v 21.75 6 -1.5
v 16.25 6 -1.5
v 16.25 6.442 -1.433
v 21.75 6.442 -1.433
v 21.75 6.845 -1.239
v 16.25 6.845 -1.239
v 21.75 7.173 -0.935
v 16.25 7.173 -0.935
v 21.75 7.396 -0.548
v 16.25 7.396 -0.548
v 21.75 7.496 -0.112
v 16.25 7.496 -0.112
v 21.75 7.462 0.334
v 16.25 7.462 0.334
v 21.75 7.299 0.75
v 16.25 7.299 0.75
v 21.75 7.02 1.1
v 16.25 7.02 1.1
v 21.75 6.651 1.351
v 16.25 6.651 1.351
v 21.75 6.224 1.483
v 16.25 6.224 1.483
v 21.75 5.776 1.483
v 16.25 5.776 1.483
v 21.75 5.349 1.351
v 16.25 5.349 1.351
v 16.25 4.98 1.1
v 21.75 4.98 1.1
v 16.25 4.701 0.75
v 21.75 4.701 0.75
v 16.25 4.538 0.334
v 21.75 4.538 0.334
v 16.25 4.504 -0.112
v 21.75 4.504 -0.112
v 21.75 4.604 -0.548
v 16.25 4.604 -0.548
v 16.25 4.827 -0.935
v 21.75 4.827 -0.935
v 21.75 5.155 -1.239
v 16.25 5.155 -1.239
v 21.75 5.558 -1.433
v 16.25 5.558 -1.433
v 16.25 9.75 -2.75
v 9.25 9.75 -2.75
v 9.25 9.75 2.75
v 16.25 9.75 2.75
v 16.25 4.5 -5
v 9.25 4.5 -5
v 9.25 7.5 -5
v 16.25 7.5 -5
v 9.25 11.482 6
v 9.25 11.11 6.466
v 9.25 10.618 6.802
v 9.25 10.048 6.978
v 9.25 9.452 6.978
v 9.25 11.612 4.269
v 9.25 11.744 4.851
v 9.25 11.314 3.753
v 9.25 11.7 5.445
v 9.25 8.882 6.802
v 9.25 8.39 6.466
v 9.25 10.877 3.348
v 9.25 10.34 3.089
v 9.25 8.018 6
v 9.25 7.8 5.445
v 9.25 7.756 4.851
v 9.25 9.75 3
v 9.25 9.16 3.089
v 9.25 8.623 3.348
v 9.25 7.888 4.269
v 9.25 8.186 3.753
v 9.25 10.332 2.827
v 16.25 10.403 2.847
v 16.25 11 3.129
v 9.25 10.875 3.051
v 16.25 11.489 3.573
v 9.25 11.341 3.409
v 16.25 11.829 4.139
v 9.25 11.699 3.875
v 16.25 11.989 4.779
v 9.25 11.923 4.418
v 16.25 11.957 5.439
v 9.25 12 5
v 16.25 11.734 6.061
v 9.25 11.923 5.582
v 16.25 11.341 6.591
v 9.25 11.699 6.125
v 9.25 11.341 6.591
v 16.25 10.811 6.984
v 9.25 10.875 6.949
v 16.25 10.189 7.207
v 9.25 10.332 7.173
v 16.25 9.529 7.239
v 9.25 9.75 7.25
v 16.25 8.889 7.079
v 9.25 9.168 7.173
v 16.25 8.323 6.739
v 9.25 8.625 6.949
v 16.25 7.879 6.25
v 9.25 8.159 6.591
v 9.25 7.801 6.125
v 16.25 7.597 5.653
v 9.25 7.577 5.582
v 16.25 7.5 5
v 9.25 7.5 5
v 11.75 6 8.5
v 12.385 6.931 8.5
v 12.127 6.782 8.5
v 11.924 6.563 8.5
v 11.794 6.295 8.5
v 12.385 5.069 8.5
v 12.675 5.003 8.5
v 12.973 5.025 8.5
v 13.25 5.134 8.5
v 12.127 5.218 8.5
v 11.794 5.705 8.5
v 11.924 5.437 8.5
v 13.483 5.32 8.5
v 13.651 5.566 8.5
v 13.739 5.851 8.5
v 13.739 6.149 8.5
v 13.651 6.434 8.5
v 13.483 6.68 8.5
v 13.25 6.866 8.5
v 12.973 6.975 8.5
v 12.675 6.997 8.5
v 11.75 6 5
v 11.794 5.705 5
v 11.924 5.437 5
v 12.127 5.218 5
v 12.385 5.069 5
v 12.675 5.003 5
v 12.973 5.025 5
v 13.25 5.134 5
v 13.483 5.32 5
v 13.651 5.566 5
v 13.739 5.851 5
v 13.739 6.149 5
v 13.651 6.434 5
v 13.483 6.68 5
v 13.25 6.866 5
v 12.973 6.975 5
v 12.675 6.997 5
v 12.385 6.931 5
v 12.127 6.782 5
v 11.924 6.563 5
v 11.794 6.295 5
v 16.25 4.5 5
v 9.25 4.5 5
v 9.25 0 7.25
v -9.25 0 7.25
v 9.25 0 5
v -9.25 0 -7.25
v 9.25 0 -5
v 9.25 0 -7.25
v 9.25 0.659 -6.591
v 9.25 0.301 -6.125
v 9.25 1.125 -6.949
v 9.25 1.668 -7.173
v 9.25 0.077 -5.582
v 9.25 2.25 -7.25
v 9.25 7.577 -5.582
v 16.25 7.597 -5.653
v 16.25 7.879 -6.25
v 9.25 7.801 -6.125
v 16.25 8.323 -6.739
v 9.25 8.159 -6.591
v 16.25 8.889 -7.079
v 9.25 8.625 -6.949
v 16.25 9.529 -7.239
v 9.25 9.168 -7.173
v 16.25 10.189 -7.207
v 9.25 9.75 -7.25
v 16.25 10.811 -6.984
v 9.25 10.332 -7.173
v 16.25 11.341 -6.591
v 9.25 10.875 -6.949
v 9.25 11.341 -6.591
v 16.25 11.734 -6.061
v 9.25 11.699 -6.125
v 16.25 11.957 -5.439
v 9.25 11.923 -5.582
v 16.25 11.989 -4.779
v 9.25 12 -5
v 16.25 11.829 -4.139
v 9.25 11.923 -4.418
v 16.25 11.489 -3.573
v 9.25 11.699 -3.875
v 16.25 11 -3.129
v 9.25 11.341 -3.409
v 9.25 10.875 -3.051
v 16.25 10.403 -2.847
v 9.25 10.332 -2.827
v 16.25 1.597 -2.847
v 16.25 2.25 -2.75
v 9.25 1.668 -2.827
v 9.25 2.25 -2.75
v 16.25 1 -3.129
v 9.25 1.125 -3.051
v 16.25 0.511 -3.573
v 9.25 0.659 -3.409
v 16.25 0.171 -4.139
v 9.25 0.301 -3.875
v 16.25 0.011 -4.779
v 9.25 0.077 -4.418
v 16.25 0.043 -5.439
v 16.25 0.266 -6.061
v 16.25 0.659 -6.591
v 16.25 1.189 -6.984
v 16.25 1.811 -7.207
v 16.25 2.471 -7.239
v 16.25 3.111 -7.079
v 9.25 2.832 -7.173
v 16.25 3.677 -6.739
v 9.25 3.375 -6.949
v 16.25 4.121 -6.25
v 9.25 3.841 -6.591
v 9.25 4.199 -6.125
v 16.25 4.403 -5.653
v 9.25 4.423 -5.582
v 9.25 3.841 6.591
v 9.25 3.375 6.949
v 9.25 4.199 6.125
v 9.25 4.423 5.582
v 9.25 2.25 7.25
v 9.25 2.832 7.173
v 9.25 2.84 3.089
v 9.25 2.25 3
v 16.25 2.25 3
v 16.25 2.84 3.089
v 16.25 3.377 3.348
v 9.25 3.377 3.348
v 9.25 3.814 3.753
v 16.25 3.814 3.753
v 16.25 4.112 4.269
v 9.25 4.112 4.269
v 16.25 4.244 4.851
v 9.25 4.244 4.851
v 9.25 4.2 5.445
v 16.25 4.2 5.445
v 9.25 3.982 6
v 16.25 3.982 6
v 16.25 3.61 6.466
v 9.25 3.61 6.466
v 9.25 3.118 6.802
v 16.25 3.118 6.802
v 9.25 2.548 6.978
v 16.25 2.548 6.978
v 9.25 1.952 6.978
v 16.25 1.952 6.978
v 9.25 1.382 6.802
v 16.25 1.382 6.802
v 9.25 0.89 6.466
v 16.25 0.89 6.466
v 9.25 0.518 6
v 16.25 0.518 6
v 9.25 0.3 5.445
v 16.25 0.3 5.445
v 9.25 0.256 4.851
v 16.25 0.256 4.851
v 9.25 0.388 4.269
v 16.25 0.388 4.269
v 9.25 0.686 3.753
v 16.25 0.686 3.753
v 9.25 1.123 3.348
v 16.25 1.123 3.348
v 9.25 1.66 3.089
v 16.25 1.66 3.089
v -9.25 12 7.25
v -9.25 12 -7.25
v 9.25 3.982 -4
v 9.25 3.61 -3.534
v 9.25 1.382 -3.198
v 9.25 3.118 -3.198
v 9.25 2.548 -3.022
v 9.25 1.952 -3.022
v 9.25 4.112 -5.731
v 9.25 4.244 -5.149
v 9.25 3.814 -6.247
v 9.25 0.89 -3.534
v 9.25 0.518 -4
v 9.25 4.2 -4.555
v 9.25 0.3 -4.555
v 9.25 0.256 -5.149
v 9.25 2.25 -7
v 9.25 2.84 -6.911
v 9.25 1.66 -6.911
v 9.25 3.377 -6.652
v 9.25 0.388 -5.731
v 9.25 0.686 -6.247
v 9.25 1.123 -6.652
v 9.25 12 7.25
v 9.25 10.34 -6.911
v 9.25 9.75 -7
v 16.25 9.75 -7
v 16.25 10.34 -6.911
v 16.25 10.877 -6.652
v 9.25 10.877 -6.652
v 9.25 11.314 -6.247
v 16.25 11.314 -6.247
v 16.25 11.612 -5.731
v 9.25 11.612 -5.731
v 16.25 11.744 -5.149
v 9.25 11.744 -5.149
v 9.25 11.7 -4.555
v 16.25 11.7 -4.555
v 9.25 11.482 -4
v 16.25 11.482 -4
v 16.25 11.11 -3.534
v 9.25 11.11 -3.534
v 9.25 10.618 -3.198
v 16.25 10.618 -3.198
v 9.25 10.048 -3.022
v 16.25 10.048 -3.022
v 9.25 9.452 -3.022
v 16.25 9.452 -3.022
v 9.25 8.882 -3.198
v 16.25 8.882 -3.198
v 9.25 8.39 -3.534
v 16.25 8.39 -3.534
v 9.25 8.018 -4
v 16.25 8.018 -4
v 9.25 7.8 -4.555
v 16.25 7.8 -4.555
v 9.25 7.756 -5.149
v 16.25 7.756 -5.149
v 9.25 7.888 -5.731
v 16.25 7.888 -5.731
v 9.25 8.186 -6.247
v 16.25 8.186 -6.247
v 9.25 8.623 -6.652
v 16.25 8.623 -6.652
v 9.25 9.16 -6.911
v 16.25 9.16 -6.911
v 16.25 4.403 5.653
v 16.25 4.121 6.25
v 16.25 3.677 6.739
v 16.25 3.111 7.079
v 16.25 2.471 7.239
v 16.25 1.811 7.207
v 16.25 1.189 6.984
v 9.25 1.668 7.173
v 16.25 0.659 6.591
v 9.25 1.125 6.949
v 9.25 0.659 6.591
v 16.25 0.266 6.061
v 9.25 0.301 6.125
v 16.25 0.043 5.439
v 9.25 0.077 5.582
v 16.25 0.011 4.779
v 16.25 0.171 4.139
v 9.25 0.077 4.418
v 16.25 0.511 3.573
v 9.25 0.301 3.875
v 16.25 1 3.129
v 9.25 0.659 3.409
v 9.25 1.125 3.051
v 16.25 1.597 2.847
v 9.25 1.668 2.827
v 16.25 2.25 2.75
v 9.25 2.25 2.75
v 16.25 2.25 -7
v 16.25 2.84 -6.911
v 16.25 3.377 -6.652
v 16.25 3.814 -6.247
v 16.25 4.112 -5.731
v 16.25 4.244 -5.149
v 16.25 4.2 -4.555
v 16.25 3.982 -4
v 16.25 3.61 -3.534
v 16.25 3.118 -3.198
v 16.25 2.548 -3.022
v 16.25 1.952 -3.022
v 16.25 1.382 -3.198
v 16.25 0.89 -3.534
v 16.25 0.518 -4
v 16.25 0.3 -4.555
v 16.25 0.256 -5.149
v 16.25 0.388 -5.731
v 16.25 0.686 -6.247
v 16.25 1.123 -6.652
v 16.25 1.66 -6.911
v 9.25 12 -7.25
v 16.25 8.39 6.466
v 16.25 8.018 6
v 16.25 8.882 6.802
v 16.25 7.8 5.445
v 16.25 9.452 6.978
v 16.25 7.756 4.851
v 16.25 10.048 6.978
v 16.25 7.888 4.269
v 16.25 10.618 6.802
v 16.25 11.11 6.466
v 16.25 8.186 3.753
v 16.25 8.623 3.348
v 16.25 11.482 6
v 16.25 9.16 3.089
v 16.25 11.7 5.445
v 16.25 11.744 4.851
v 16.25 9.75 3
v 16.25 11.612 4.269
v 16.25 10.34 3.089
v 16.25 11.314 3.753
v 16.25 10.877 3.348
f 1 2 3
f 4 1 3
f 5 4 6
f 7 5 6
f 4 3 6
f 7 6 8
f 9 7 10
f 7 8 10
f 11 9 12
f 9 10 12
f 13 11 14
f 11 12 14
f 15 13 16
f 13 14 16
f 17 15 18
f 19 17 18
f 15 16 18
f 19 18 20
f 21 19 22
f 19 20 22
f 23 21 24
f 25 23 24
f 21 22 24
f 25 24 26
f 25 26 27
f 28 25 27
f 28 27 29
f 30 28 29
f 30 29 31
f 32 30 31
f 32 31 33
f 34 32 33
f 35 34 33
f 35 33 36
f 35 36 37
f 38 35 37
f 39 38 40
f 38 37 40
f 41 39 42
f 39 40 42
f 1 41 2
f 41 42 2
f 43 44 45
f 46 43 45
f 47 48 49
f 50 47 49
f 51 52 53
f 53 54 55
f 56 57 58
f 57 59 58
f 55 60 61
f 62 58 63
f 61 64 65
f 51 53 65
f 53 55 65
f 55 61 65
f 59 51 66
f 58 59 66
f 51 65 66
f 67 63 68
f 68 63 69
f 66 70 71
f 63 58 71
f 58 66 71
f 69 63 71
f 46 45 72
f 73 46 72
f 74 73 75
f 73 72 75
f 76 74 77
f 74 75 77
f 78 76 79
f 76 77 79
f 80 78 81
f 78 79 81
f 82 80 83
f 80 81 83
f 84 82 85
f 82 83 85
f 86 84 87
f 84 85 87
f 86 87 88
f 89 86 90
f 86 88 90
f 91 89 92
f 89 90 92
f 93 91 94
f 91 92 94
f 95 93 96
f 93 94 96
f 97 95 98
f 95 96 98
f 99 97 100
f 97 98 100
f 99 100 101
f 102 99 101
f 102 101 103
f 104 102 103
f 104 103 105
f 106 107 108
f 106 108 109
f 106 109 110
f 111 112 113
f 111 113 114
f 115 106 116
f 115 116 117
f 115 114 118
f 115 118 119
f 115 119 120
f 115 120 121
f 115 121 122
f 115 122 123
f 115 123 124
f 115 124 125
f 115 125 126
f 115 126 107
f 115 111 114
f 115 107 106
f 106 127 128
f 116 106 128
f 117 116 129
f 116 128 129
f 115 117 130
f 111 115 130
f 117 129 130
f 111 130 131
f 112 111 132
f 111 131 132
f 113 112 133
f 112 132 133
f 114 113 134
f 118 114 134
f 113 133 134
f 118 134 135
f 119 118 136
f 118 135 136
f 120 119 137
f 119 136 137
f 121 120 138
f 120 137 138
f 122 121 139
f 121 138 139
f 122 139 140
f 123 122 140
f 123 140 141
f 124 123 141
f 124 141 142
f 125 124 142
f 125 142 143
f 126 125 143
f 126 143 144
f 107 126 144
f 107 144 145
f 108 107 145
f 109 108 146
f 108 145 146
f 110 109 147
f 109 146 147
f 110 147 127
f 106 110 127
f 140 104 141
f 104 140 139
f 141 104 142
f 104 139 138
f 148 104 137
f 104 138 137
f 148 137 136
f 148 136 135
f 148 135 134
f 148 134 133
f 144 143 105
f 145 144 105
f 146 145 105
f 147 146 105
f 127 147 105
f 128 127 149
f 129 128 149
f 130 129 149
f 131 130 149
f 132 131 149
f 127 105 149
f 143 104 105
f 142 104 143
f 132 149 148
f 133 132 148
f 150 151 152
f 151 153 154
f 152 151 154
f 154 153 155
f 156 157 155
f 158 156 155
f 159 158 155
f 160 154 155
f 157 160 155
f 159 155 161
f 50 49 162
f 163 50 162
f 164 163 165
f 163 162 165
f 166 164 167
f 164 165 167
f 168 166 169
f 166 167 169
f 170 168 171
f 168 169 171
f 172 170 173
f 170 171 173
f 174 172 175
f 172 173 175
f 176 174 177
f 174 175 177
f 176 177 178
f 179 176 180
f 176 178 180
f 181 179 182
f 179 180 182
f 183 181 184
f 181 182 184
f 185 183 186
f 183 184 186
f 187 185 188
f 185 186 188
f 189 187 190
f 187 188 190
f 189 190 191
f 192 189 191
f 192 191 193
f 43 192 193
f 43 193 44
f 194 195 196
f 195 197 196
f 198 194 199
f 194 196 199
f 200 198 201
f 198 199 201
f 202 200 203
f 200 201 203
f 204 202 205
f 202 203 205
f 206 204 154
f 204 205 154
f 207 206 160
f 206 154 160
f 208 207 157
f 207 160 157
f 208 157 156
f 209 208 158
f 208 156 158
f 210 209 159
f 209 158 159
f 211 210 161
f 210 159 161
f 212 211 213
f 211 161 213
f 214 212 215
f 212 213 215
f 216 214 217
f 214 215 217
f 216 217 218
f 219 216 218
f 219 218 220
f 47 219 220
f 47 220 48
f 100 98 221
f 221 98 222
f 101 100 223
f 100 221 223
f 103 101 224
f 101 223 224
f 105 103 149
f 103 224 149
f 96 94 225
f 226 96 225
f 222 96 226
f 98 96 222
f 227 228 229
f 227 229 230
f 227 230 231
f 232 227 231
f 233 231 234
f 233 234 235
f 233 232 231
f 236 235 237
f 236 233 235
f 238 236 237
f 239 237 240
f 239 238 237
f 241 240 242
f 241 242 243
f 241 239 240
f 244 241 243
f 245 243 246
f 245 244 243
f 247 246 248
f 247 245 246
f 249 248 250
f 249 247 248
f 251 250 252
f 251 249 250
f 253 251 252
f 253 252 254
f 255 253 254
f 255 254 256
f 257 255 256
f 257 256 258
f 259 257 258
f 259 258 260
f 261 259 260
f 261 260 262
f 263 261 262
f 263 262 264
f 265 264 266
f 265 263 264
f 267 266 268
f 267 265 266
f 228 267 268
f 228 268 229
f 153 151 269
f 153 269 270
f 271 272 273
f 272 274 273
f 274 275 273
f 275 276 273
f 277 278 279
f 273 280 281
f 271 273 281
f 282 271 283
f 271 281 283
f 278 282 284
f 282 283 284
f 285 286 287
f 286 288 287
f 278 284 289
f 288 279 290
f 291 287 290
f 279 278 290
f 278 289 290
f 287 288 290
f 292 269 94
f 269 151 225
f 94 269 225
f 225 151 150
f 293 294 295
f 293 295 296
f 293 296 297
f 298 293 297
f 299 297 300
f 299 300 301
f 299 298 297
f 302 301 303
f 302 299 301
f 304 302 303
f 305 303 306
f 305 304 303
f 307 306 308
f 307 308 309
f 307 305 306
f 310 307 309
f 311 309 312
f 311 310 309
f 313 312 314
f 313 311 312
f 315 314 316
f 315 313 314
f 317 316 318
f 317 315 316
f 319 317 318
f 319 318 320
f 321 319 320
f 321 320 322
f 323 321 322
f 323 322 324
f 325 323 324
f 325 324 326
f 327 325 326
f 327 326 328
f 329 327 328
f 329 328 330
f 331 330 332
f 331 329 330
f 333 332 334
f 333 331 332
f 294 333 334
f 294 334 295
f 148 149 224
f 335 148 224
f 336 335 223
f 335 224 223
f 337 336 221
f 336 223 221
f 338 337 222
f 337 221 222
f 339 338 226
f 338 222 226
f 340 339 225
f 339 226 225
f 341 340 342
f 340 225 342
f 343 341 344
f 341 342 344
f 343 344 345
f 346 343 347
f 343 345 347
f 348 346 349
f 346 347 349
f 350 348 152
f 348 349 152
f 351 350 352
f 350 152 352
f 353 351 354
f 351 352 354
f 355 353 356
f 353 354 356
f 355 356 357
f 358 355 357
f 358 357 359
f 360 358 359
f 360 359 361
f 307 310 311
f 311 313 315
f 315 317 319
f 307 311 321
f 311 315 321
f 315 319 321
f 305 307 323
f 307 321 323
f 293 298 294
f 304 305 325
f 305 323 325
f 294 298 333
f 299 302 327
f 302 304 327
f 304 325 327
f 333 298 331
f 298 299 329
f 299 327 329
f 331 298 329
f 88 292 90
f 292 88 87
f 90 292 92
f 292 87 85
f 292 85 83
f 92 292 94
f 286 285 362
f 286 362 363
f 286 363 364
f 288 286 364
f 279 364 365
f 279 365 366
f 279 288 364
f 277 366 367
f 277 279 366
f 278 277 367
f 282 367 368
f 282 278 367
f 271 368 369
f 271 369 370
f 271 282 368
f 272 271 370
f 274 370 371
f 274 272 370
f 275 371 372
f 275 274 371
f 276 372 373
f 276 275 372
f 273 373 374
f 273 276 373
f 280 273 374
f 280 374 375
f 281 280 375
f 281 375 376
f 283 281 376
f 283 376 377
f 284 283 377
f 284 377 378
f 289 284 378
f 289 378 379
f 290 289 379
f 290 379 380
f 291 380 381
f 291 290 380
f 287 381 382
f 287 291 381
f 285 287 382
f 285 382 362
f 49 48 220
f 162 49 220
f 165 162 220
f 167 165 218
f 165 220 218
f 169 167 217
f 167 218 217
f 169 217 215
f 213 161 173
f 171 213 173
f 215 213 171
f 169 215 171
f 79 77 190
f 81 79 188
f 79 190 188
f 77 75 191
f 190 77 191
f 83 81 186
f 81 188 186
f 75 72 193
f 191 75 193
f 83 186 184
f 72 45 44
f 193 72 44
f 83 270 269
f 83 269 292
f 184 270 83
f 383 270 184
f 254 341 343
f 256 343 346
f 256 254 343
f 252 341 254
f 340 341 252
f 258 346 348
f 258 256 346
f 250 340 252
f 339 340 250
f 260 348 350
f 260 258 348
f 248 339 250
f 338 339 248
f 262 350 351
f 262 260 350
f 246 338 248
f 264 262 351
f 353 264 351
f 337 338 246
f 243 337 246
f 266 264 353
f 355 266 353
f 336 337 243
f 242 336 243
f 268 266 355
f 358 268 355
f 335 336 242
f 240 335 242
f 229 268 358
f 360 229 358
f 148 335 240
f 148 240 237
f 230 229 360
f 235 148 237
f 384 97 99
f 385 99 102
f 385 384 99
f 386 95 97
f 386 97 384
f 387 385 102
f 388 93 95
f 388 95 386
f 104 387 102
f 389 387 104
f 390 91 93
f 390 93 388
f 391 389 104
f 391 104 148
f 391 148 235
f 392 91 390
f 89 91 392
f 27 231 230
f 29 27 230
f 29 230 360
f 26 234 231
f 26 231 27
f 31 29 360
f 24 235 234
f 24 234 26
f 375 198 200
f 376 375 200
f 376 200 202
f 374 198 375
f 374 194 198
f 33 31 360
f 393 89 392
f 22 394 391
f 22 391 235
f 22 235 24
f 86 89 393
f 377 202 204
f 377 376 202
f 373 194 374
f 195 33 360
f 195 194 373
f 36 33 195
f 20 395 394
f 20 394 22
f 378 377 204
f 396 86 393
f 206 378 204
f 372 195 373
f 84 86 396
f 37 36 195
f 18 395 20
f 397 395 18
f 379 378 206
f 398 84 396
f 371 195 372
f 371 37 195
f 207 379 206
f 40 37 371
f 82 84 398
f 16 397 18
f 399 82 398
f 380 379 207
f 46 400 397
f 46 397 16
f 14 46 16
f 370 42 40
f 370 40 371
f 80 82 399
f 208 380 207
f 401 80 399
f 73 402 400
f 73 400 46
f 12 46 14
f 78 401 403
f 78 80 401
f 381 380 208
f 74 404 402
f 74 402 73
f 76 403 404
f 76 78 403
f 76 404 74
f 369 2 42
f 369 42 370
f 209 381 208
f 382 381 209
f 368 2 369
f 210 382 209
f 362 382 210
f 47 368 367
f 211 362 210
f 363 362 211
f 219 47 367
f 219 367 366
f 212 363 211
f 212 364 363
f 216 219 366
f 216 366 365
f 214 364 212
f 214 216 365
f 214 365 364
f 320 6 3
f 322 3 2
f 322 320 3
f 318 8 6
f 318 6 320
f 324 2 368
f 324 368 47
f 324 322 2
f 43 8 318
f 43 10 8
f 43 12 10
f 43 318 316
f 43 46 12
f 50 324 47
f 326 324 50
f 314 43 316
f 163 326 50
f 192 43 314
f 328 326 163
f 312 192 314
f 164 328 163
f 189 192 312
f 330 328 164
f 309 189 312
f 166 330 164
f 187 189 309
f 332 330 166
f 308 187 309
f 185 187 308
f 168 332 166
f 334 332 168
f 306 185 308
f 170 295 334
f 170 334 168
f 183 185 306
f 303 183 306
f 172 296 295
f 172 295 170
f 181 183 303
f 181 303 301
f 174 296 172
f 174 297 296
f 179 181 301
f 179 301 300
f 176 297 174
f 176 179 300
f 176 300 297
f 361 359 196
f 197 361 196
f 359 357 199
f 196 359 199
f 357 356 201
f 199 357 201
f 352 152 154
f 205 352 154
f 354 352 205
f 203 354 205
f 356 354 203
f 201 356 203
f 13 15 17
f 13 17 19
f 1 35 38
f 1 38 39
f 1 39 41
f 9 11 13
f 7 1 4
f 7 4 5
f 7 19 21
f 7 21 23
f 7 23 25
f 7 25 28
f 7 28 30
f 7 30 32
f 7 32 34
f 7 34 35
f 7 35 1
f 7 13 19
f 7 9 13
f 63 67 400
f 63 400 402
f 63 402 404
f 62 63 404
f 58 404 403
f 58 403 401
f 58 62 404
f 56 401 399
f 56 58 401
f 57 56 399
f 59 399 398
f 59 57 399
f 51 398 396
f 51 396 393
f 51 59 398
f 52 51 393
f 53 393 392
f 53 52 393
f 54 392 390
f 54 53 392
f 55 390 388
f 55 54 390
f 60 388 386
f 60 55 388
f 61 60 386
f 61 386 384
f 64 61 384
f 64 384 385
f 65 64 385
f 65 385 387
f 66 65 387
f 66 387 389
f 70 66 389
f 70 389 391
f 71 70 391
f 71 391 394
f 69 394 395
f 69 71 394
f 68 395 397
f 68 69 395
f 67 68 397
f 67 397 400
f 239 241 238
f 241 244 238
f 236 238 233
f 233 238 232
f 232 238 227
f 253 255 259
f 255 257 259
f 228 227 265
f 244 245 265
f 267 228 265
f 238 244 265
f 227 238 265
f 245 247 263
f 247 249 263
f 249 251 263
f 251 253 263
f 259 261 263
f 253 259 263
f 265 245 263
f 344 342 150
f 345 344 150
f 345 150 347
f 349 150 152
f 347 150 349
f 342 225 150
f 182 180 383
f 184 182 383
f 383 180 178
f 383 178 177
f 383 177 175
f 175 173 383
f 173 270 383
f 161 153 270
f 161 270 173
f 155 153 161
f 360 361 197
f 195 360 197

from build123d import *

# Parameters (mm, degrees)
SKETCH_1_W      = 18.5
SKETCH_1_H      = 14.5
EXTRUDE_1_DEPTH = 12
SKETCH_2_R      = 2.25
SKETCH_2_R_2    = 2
EXTRUDE_2_DEPTH = 7
SKETCH_4_R      = 1.5
EXTRUDE_3_DEPTH = 5.5
SKETCH_6_R      = 1
EXTRUDE_4_DEPTH = 3.5


with BuildPart() as part:
    # 스케치1 → 보스-돌출1 (new body)
    with BuildSketch(Plane(origin=(0, 0, 0), x_dir=(1, 0, 0), z_dir=(0, 1, 0))):
        Rectangle(SKETCH_1_W, SKETCH_1_H)
    extrude(amount=EXTRUDE_1_DEPTH)

    # 스케치2 → 보스-돌출2 (add)
    # profile 1 of 5: a face of its own
    with BuildSketch(Plane(origin=(9.25, 0, 0), x_dir=(0, 0, -1), z_dir=(1, 0, 0))):
        with Locations((-5, 9.75)):
            Circle(SKETCH_2_R)
        with Locations((-5, 9.75)):
            Circle(SKETCH_2_R_2, mode=Mode.SUBTRACT)
    # profile 2 of 5: a face of its own
    with BuildSketch(Plane(origin=(9.25, 0, 0), x_dir=(0, 0, -1), z_dir=(1, 0, 0))):
        with BuildLine():
            Line((2.75, 9.75), (-2.75, 9.75))
            ThreePointArc((-2.75, 9.75), (-3.409009742, 8.159009742), (-5, 7.5))
            Line((-5, 7.5), (-5, 4.5))
            ThreePointArc((-5, 4.5), (-3.409009742, 3.840990258), (-2.75, 2.25))
            Line((-2.75, 2.25), (2.75, 2.25))
            ThreePointArc((2.75, 2.25), (3.409009742, 3.840990258), (5, 4.5))
            Line((5, 4.5), (5, 7.5))
            ThreePointArc((5, 7.5), (3.409009742, 8.159009742), (2.75, 9.75))
        make_face()
    # profile 3 of 5: a face of its own
    with BuildSketch(Plane(origin=(9.25, 0, 0), x_dir=(0, 0, -1), z_dir=(1, 0, 0))):
        with Locations((5, 9.75)):
            Circle(SKETCH_2_R)
        with Locations((5, 9.75)):
            Circle(SKETCH_2_R_2, mode=Mode.SUBTRACT)
    # profile 4 of 5: a face of its own
    with BuildSketch(Plane(origin=(9.25, 0, 0), x_dir=(0, 0, -1), z_dir=(1, 0, 0))):
        with Locations((5, 2.25)):
            Circle(SKETCH_2_R)
        with Locations((5, 2.25)):
            Circle(SKETCH_2_R_2, mode=Mode.SUBTRACT)
    # profile 5 of 5: a face of its own
    with BuildSketch(Plane(origin=(9.25, 0, 0), x_dir=(0, 0, -1), z_dir=(1, 0, 0))):
        with Locations((-5, 2.25)):
            Circle(SKETCH_2_R)
        with Locations((-5, 2.25)):
            Circle(SKETCH_2_R_2, mode=Mode.SUBTRACT)
    extrude(amount=EXTRUDE_2_DEPTH)

    # 스케치4 → 보스-돌출3 (add)
    with BuildSketch(Plane(origin=(16.25, 0, 0), x_dir=(0, 0, -1), z_dir=(1, 0, 0))):
        with Locations((0, 6)):
            Circle(SKETCH_4_R)
    extrude(amount=EXTRUDE_3_DEPTH)

    # 스케치6 → 보스-돌출4 (add)
    with BuildSketch(Plane.XY.offset(5)):
        with Locations(Location((12.75, 6, 0), (0, 0, 180))):
            Circle(SKETCH_6_R)
    extrude(amount=EXTRUDE_4_DEPTH)


solid = part.part
